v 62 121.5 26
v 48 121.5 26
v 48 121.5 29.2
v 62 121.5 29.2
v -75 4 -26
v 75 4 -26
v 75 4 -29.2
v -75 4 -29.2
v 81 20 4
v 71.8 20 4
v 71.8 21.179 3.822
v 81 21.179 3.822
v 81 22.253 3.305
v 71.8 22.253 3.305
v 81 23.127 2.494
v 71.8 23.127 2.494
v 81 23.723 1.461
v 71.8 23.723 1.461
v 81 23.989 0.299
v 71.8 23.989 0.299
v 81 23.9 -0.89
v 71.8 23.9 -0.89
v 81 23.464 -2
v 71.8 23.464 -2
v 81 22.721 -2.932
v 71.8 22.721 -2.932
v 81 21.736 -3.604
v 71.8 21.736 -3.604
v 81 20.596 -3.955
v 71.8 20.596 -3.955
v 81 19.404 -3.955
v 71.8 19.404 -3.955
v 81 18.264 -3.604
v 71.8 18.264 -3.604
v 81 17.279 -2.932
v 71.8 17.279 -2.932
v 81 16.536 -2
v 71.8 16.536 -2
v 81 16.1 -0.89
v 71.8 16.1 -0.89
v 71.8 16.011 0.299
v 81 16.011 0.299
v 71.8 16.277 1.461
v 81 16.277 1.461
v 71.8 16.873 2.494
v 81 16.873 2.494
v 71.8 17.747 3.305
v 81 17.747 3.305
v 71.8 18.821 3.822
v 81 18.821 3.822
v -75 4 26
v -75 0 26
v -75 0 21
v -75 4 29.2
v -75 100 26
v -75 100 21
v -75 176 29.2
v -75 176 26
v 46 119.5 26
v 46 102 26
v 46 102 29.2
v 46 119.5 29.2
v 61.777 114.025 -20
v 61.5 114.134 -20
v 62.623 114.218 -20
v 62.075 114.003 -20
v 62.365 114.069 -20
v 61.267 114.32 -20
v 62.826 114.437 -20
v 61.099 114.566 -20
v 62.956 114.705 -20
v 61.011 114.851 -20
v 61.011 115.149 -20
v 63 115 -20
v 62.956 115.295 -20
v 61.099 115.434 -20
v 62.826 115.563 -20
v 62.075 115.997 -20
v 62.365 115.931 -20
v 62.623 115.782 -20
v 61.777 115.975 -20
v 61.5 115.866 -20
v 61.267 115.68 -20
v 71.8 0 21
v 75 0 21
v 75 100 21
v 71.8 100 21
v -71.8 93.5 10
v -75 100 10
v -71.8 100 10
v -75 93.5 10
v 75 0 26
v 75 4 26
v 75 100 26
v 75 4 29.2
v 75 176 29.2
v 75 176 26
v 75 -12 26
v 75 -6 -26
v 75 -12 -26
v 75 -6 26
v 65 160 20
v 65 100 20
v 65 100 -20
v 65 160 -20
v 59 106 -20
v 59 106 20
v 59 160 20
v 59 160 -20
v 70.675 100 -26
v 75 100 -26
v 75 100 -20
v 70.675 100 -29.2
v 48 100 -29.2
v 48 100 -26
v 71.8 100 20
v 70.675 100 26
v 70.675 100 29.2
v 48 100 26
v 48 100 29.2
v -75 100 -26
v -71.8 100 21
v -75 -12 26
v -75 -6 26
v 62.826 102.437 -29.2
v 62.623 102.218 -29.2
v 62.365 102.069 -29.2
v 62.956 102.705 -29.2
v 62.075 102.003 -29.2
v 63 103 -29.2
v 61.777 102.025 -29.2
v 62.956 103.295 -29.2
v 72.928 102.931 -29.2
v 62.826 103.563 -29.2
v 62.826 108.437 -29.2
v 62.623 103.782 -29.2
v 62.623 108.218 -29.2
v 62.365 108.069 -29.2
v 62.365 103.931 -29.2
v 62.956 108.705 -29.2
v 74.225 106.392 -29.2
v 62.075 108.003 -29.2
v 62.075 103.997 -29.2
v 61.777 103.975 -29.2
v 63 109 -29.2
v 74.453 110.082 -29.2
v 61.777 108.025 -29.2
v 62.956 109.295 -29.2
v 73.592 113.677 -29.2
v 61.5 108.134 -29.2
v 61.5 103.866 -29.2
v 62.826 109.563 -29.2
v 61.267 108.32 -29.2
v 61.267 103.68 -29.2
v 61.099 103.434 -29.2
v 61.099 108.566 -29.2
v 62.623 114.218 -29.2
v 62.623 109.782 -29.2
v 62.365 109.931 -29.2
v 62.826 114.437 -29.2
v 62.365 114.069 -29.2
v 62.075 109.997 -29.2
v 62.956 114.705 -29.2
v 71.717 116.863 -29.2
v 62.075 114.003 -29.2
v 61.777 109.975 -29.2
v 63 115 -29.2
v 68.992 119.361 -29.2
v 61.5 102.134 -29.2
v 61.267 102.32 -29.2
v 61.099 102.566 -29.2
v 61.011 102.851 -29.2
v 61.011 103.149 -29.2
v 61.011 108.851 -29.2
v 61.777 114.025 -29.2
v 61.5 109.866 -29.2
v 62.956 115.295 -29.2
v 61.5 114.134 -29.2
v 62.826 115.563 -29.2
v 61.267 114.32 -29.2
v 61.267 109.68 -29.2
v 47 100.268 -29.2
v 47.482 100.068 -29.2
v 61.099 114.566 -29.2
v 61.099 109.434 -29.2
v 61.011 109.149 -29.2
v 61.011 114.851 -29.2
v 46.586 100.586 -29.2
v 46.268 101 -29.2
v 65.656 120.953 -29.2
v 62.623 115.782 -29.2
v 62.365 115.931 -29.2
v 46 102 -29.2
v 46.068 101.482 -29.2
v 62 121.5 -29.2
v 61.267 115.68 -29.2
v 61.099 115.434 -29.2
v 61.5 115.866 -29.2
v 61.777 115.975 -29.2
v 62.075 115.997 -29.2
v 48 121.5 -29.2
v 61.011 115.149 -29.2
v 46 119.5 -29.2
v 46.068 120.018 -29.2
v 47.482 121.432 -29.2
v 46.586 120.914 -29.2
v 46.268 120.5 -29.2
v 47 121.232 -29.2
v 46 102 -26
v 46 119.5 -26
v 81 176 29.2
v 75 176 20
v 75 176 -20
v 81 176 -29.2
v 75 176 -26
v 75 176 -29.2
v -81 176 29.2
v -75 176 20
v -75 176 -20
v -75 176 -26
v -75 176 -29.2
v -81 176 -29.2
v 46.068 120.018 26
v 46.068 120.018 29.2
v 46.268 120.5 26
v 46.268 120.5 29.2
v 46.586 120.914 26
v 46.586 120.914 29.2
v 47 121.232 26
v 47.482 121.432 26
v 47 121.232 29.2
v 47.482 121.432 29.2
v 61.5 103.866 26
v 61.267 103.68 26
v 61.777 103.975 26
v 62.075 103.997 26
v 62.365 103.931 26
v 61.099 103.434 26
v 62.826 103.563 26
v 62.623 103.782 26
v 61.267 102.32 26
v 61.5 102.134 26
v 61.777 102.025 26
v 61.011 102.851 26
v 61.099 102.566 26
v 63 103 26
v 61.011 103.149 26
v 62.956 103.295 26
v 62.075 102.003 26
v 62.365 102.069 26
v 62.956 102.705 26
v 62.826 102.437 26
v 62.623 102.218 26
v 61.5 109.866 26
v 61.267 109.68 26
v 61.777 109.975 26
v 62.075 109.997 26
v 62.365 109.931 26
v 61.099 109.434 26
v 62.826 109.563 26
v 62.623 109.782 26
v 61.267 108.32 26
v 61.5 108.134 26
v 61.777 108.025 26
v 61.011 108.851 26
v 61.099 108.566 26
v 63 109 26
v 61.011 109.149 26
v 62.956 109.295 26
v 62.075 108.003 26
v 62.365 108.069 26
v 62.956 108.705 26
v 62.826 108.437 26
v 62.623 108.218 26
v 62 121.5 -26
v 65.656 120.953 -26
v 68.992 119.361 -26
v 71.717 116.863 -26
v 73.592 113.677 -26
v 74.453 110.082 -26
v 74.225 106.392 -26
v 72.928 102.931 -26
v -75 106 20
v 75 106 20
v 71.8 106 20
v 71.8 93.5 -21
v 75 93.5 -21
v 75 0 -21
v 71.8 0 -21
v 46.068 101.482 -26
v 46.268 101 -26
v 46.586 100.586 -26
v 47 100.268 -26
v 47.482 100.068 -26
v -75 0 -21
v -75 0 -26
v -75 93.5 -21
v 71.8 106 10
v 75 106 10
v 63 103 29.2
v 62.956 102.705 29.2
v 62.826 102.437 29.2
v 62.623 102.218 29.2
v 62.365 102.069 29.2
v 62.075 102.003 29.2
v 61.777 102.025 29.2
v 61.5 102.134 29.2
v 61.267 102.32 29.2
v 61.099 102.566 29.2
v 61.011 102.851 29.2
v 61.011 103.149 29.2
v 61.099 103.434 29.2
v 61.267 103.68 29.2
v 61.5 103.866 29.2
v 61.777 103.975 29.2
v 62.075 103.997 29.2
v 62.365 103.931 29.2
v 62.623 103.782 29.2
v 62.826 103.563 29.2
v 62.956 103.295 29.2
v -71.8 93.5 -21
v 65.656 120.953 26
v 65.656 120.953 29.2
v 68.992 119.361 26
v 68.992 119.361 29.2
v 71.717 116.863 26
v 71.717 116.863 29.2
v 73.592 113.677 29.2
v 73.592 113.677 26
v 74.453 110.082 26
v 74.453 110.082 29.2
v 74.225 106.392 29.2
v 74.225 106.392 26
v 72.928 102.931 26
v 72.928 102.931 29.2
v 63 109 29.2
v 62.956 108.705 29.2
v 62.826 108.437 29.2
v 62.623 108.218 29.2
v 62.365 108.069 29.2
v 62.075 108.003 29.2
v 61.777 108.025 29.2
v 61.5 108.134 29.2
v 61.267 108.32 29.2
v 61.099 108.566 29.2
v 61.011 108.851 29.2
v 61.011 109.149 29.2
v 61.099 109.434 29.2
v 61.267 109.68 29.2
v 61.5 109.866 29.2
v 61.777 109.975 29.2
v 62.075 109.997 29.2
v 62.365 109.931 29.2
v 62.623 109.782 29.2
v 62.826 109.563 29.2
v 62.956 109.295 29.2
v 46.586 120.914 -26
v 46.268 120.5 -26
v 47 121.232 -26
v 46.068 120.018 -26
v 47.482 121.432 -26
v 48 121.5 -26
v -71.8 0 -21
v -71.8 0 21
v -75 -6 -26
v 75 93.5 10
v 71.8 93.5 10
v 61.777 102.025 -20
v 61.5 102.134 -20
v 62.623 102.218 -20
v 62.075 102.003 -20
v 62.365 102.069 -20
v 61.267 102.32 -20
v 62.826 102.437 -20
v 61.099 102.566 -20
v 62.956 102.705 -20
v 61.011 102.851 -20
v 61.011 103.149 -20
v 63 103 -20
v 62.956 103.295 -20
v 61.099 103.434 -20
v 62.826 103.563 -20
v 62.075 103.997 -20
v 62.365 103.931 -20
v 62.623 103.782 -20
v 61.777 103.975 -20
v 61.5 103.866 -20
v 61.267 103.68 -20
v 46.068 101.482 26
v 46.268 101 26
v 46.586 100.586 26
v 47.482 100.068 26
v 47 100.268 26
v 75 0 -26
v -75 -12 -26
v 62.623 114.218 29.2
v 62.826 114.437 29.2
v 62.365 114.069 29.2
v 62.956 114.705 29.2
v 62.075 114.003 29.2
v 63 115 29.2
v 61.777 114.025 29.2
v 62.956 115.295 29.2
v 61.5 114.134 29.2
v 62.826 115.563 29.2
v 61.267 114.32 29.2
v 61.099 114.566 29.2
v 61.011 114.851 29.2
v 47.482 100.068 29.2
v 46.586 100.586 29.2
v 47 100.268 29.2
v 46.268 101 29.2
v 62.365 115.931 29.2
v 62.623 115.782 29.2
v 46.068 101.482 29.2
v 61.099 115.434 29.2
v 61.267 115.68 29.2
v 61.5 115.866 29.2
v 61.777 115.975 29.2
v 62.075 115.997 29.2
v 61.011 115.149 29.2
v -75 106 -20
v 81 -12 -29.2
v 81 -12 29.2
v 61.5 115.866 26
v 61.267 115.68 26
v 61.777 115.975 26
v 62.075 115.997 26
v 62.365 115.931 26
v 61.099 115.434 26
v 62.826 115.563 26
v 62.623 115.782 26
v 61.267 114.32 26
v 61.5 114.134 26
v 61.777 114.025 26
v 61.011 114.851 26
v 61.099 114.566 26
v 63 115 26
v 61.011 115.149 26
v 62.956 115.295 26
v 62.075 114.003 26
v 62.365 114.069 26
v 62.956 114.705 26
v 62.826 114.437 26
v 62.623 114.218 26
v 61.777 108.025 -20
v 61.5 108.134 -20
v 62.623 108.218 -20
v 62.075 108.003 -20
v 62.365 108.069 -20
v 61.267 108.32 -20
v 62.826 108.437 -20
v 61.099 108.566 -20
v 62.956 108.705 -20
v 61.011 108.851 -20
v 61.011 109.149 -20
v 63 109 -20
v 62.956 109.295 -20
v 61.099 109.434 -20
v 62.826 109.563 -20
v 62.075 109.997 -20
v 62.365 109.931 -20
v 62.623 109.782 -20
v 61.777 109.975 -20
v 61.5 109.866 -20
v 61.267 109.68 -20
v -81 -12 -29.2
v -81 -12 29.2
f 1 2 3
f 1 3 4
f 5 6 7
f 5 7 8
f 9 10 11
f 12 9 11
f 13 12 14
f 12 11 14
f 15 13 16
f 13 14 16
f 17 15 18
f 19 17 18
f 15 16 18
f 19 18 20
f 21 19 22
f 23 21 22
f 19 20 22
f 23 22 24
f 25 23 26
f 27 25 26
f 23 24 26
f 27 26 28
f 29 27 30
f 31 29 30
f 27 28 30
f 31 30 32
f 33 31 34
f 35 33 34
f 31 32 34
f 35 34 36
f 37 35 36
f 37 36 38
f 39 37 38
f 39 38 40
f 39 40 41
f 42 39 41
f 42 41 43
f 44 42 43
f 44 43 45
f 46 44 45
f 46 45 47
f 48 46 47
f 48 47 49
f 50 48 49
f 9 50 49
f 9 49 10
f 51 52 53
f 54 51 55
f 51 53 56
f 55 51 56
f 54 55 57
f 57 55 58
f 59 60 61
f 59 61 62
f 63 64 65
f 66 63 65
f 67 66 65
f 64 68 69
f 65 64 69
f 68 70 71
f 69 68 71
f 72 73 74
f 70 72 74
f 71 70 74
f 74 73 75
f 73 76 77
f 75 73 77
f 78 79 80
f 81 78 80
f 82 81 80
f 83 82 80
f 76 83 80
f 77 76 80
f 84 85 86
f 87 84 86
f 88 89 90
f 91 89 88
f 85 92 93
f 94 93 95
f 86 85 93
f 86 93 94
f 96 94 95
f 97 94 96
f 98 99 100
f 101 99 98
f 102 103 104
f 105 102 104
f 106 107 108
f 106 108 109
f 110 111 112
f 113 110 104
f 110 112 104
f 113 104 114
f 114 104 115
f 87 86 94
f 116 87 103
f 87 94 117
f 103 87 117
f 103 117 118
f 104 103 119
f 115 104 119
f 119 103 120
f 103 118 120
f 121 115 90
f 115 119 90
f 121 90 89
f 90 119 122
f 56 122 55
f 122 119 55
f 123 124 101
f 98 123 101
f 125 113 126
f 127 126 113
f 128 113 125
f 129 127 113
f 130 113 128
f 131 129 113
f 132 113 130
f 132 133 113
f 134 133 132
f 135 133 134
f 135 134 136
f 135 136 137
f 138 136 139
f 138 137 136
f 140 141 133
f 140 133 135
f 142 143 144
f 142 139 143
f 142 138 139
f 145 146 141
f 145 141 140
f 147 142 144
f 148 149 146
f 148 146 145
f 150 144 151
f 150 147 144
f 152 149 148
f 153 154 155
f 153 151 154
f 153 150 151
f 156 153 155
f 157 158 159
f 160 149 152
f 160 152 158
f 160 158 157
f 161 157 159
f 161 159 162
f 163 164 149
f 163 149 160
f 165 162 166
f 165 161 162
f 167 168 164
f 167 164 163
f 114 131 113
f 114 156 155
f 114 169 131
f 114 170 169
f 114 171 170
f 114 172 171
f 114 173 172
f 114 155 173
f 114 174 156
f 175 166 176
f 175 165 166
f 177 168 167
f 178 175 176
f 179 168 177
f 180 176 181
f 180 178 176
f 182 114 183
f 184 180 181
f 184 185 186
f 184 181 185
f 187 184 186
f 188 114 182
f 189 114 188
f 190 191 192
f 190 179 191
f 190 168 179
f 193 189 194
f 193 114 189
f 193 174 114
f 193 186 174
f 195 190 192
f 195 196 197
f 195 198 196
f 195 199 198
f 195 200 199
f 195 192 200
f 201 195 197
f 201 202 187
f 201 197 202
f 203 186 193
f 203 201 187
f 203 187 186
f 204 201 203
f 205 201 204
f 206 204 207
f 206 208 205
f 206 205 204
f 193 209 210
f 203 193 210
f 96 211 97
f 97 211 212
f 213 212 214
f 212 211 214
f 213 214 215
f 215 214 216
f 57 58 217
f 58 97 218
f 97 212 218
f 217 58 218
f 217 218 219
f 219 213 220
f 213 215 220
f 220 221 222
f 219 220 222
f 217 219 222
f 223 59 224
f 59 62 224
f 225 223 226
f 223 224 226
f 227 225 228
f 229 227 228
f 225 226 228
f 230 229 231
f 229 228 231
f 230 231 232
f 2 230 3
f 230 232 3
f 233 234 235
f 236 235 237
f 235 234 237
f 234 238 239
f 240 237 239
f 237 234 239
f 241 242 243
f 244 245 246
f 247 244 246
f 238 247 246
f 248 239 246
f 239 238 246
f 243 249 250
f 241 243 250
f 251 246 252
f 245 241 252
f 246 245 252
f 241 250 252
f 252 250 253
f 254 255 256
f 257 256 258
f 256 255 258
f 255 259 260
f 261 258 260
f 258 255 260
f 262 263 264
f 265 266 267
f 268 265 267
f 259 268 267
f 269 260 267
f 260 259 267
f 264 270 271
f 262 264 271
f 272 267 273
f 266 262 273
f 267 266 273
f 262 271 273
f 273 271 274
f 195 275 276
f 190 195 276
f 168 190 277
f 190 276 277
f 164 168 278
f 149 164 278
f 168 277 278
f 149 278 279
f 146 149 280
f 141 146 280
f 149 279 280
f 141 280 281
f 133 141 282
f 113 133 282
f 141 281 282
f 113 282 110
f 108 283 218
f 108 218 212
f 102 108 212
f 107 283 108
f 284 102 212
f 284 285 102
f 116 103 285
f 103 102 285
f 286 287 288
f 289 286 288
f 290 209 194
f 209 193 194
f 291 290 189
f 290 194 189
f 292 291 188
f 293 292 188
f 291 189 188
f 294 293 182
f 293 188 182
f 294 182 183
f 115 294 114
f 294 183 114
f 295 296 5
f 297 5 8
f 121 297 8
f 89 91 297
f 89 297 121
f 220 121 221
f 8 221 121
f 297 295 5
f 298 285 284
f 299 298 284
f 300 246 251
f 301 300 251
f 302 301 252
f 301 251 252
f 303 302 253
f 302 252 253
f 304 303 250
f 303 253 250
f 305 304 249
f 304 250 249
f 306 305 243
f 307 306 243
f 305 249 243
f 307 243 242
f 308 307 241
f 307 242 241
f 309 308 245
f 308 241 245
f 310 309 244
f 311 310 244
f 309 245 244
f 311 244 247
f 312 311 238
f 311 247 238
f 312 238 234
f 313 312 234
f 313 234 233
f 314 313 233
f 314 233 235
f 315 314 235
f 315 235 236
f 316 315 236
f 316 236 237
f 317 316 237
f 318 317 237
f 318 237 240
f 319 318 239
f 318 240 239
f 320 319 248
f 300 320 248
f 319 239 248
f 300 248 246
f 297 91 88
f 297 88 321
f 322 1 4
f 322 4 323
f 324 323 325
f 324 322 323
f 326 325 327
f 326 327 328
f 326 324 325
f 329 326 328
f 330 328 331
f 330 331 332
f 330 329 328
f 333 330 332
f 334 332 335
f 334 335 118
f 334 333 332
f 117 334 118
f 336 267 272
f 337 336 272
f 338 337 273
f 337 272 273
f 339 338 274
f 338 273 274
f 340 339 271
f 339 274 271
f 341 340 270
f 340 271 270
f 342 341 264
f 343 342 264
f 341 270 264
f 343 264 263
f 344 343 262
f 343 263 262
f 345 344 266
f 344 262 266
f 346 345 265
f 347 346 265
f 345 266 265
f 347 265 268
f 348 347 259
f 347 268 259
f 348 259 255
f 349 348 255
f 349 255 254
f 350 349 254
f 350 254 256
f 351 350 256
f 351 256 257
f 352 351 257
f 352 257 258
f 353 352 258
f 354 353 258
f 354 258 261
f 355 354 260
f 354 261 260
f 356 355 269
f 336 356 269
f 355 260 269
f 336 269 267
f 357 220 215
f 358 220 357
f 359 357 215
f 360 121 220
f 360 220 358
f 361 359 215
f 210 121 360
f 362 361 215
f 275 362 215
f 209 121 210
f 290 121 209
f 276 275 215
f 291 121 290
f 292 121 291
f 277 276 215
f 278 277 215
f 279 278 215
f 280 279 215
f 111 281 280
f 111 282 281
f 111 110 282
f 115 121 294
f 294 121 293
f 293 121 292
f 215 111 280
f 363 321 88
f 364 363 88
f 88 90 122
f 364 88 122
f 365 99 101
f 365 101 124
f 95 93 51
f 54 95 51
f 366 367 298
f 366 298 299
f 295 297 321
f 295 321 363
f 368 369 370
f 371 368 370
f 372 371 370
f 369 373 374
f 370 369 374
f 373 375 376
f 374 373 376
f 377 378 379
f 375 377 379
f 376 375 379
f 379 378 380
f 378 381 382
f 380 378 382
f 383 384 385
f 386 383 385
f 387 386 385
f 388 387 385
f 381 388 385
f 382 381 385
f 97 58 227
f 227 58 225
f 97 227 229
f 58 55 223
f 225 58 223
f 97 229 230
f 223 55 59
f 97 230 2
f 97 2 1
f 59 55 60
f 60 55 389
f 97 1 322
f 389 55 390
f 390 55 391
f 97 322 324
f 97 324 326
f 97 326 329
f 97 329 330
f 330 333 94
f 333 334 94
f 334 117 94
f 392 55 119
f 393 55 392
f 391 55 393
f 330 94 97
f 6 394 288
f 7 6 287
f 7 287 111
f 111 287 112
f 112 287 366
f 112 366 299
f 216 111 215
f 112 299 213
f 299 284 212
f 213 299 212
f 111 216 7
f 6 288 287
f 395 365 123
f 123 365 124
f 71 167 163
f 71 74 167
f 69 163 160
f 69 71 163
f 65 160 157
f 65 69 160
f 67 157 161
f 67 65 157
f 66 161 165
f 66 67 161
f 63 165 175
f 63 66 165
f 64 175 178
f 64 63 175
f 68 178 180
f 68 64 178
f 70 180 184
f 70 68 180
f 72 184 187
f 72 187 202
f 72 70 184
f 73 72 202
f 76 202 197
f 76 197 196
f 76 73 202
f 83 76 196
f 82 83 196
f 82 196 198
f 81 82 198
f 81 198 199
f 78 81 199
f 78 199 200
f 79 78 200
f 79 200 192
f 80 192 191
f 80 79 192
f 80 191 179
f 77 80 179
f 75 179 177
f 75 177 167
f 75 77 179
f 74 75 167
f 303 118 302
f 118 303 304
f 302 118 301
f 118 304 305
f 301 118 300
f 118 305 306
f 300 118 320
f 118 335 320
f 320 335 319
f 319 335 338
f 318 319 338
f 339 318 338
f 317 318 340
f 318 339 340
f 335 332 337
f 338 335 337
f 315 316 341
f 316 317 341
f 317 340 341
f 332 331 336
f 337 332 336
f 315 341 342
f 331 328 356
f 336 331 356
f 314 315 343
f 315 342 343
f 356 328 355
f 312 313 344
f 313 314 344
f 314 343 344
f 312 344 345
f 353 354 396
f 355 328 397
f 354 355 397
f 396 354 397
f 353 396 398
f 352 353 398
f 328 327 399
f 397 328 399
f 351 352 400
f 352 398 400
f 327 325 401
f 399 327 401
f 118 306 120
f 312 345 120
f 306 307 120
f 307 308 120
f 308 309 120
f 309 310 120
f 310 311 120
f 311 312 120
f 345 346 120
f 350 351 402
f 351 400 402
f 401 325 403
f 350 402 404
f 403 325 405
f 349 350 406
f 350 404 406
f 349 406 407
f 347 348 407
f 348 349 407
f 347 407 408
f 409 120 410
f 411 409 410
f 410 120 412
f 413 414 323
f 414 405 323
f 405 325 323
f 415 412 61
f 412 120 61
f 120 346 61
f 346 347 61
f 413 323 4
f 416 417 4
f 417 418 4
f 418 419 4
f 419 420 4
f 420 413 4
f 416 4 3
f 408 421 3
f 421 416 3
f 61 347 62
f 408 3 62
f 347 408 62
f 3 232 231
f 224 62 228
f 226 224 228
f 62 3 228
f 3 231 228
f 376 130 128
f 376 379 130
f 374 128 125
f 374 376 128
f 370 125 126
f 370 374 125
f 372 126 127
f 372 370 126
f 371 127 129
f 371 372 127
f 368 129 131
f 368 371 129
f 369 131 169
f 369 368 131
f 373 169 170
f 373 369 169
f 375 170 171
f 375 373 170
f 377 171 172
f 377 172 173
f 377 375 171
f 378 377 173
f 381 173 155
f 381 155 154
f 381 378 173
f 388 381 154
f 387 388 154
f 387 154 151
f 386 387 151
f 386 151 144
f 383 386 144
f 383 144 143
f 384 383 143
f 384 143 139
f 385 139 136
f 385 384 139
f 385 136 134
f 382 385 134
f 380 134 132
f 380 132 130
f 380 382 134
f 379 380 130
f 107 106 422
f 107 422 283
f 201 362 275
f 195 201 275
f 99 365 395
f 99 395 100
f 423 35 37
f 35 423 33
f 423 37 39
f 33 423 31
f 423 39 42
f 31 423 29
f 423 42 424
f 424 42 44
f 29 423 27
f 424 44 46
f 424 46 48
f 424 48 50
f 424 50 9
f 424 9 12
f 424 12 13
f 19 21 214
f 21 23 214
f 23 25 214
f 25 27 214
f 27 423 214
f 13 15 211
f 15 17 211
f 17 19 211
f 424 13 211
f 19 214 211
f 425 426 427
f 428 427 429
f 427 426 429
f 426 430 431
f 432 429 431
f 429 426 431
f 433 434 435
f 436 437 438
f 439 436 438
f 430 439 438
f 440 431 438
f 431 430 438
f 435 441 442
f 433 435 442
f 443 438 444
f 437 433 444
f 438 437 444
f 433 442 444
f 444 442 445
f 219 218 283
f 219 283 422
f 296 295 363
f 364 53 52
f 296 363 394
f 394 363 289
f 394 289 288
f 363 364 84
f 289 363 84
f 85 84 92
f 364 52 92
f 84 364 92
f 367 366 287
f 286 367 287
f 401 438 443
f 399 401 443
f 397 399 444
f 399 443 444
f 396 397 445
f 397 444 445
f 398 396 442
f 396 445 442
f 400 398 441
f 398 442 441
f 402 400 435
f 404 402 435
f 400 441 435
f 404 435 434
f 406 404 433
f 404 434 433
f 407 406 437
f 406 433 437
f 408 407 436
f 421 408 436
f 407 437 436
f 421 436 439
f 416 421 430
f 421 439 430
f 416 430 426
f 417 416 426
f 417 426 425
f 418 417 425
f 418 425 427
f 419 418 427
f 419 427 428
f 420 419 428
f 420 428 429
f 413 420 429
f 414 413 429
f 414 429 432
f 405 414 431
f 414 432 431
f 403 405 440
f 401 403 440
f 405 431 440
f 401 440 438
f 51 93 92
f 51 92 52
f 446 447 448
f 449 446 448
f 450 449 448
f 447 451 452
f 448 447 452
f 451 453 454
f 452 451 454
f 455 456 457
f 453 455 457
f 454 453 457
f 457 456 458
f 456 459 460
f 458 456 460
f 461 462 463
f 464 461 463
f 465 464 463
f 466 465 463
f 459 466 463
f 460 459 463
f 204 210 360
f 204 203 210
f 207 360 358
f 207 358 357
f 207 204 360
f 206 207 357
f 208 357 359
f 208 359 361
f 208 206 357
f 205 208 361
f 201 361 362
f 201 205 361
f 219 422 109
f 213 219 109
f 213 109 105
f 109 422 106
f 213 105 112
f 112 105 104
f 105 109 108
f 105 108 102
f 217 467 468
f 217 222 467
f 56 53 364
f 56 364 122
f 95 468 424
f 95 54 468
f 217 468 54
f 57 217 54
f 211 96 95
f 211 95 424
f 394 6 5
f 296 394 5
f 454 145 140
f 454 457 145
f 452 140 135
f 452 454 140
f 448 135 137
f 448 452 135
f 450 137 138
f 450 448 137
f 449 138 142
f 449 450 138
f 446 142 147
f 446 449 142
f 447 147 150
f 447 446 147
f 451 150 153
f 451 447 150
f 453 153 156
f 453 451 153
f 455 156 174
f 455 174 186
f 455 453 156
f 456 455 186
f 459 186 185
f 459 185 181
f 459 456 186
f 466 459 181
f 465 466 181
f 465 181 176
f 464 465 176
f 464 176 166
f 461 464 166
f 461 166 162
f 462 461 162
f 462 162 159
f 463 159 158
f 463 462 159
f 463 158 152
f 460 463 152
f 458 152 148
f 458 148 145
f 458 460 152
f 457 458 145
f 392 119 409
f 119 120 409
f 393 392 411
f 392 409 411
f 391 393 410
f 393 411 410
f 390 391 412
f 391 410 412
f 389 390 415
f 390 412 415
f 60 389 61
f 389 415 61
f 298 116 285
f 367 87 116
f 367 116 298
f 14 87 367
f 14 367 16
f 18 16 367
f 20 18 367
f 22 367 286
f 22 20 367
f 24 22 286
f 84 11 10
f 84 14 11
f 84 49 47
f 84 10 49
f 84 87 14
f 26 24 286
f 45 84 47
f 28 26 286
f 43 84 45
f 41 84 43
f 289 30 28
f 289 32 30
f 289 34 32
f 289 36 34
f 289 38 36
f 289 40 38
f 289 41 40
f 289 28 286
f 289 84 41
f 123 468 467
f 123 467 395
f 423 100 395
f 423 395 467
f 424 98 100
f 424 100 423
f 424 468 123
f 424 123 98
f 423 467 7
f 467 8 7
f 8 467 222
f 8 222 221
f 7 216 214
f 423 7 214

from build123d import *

# Parameters (mm, degrees)
SKETCH1_W            = 150
SKETCH1_H            = 42
BOSS_EXTRUDE1_DEPTH  = 3.2
SKETCH2_W            = 162
SKETCH2_H            = 52
BOSS_EXTRUDE2_DEPTH  = 6
SKETCH3_W            = 6
SKETCH3_H            = 52
BOSS_EXTRUDE3_DEPTH  = 176
BOSS_EXTRUDE4_REACH  = 238.618
SKETCH5_W            = 52
SKETCH5_H            = 6
BOSS_EXTRUDE5_START  = 100
SKETCH1_2_W          = 150
SKETCH1_2_H          = 42
BOSS_EXTRUDE5_DEPTH  = 3.2
SKETCH6_W            = 150
SKETCH6_H            = 6
BOSS_EXTRUDE6_DEPTH  = 70
CUT_EXTRUDE1_REACH   = 142.645
SKETCH7_W            = 10
SKETCH7_H            = 40
SKETCH7_R            = 3
SKETCH7_3_W          = 6
SKETCH7_3_H          = 40
BOSS_EXTRUDE7_DEPTH  = 54
SKETCH8_W            = 162
SKETCH8_H            = 10
BOSS_EXTRUDE8_DEPTH  = 3.2
SKETCH9_W            = 150
SKETCH9_H            = 42
CUT_EXTRUDE2_DEPTH   = 3.2
CUT_EXTRUDE3_DEPTH   = 3.2
BOSS_EXTRUDE9_DEPTH  = 3.2
SKETCH12_W           = 3.2
SKETCH12_H           = 10
BOSS_EXTRUDE10_DEPTH = 6
CUT_EXTRUDE4_REACH   = 236.897
SKETCH13_R           = 4
CUT_EXTRUDE5_REACH   = 201.894
SKETCH14_R           = 1
SKETCH16_W           = 6
SKETCH16_H           = 172
BOSS_EXTRUDE11_DEPTH = 3.2
SKETCH17_W           = 162
SKETCH17_H           = 58.4
SKETCH17_W_2         = 150
SKETCH17_H_2         = 52
BOSS_EXTRUDE12_DEPTH = 6
SKETCH15_R           = 1
BOSS_EXTRUDE14_DEPTH = 3.2
FILLET1_R            = 2
FILLET1_OF_MIRROR4_R = 2


with BuildPart() as part:
    # Sketch1 → Boss-Extrude1 (new body)
    with BuildSketch(Plane(origin=(0, 0, 0), x_dir=(1, 0, 0), z_dir=(0, 1, 0))):
        Rectangle(SKETCH1_W, SKETCH1_H)
    extrude(amount=BOSS_EXTRUDE1_DEPTH)

    # Sketch2 → Boss-Extrude2 (add)
    with BuildSketch(Plane.XZ):
        Rectangle(SKETCH2_W, SKETCH2_H)
    extrude(amount=BOSS_EXTRUDE2_DEPTH)

    # Sketch3 → Boss-Extrude3 (add)
    with BuildSketch(Plane(origin=(0, 0, 0), x_dir=(1, 0, 0), z_dir=(0, 1, 0))):
        with Locations((78, 0)):
            Rectangle(SKETCH3_W, SKETCH3_H)
        with Locations((-78, 0)):
            Rectangle(SKETCH3_W, SKETCH3_H)
    extrude(amount=BOSS_EXTRUDE3_DEPTH)

    # Sketch5 → Boss-Extrude4 (add, up to next)
    with BuildSketch(Plane.ZY.offset(-75), mode=Mode.PRIVATE) as boss_extrude4_sk1:
        with Locations((0, 103)):
            Rectangle(SKETCH5_W, SKETCH5_H)
    boss_extrude4_tool1 = extrude(boss_extrude4_sk1.sketch, amount=BOSS_EXTRUDE4_REACH, mode=Mode.PRIVATE) - part.part
    add(boss_extrude4_tool1.solids().sort_by_distance((75, 103, 0))[0])

    # Sketch1<2> → Boss-Extrude5 (add)
    with BuildSketch(Plane(origin=(0, 0, 0), x_dir=(1, 0, 0), z_dir=(0, 1, 0)).offset(BOSS_EXTRUDE5_START)):
        Rectangle(SKETCH1_2_W, SKETCH1_2_H)
    extrude(amount=-BOSS_EXTRUDE5_DEPTH)

    # Sketch6 → Boss-Extrude6 (add)
    with BuildSketch(Plane(origin=(0, 106, 0), x_dir=(1, 0, 0), z_dir=(0, 1, 0))):
        with Locations((0, -23)):
            Rectangle(SKETCH6_W, SKETCH6_H)
        with Locations((0, 23)):
            Rectangle(SKETCH6_W, SKETCH6_H)
    extrude(amount=BOSS_EXTRUDE6_DEPTH)

    # Sketch7 → Cut-Extrude1 (cut, up to next)
    with BuildSketch(Plane(origin=(0, 106, 0), x_dir=(1, 0, 0), z_dir=(0, 1, 0)), mode=Mode.PRIVATE) as cut_extrude1_sk1:
        with Locations((70, 0)):
            Rectangle(SKETCH7_W, SKETCH7_H)
        with Locations((70, -15)):
            Circle(SKETCH7_R, mode=Mode.SUBTRACT)
        with Locations((70, 15)):
            Circle(SKETCH7_R, mode=Mode.SUBTRACT)
    cut_extrude1_tool1 = extrude(cut_extrude1_sk1.sketch, amount=-CUT_EXTRUDE1_REACH, mode=Mode.PRIVATE) & part.part
    # Sketch7 → Cut-Extrude1 (cut, up to next)
    with BuildSketch(Plane(origin=(0, 106, 0), x_dir=(1, 0, 0), z_dir=(0, 1, 0)), mode=Mode.PRIVATE) as cut_extrude1_sk2:
        with Locations((70, -15)):
            Circle(SKETCH7_R)
    cut_extrude1_tool2 = extrude(cut_extrude1_sk2.sketch, amount=-CUT_EXTRUDE1_REACH, mode=Mode.PRIVATE) & part.part
    # Sketch7 → Cut-Extrude1 (cut, up to next)
    with BuildSketch(Plane(origin=(0, 106, 0), x_dir=(1, 0, 0), z_dir=(0, 1, 0)), mode=Mode.PRIVATE) as cut_extrude1_sk3:
        with Locations((70, 15)):
            Circle(SKETCH7_R)
    cut_extrude1_tool3 = extrude(cut_extrude1_sk3.sketch, amount=-CUT_EXTRUDE1_REACH, mode=Mode.PRIVATE) & part.part
    add(cut_extrude1_tool1.solids().sort_by_distance((70, 106, 0))[0], mode=Mode.SUBTRACT)
    add(cut_extrude1_tool2.solids().sort_by_distance((70, 106, 15))[0], mode=Mode.SUBTRACT)
    add(cut_extrude1_tool3.solids().sort_by_distance((70, 106, -15))[0], mode=Mode.SUBTRACT)

    # Sketch7<3> → Boss-Extrude7 (add)
    with BuildSketch(Plane(origin=(0, 106, 0), x_dir=(1, 0, 0), z_dir=(0, 1, 0))):
        with Locations((62, 0)):
            Rectangle(SKETCH7_3_W, SKETCH7_3_H)
    extrude(amount=BOSS_EXTRUDE7_DEPTH)

    # Sketch8 → Boss-Extrude8 (add)
    with BuildSketch(Plane(origin=(0, 0, -26), x_dir=(-1, 0, 0), z_dir=(0, 0, -1))):
        with Locations((0, -1)):
            Rectangle(SKETCH8_W, SKETCH8_H)
    boss_extrude8 = extrude(amount=BOSS_EXTRUDE8_DEPTH)

    # Mirror1: Boss-Extrude8 across plane
    add(boss_extrude8.mirror(Plane.XY))

    # Sketch9 → Cut-Extrude2 (cut)
    with BuildSketch(Plane(origin=(0, 3.2, 0), x_dir=(1, 0, 0), z_dir=(0, 1, 0))):
        Rectangle(SKETCH9_W, SKETCH9_H)
    extrude(amount=-CUT_EXTRUDE2_DEPTH, mode=Mode.SUBTRACT)

    # Sketch10 → Cut-Extrude3 (cut)
    with BuildSketch(Plane.XZ.offset(-96.8)):
        Polygon((-75, -21), (75, -21), (75, -20), (65, -20), (65, 20), (75, 20), (75, 21), (-75, 21), align=None)
    extrude(amount=-CUT_EXTRUDE3_DEPTH, mode=Mode.SUBTRACT)

    # Sketch11 → Boss-Extrude9 (add)
    with BuildSketch(Plane.ZY.offset(-75)):
        Polygon((10, 93.5), (-21, 93.5), (-21, 0), (21, 0), (21, 100), (10, 100), align=None)
    boss_extrude9 = extrude(amount=BOSS_EXTRUDE9_DEPTH)

    # Mirror2: Boss-Extrude9 across plane
    add(boss_extrude9.mirror(Plane(origin=(0, 0, 0), x_dir=(0, 0, 1), z_dir=(1, 0, 0))))

    # Sketch12 → Boss-Extrude10 (add)
    with BuildSketch(Plane(origin=(0, 100, 0), x_dir=(1, 0, 0), z_dir=(0, 1, 0))):
        with Locations((73.4, -15)):
            Rectangle(SKETCH12_W, SKETCH12_H)
    extrude(amount=BOSS_EXTRUDE10_DEPTH)

    # Sketch13 → Cut-Extrude4 (cut, up to next)
    with BuildSketch(Plane.ZY.offset(-71.8), mode=Mode.PRIVATE) as cut_extrude4_sk1:
        with Locations((0, 20)):
            Circle(SKETCH13_R)
    cut_extrude4_tool1 = extrude(cut_extrude4_sk1.sketch, amount=-CUT_EXTRUDE4_REACH, mode=Mode.PRIVATE) & part.part
    add(cut_extrude4_tool1.solids().sort_by_distance((71.8, 20, 0))[0], mode=Mode.SUBTRACT)

    # Sketch14 → Cut-Extrude5 (cut, up to next)
    with BuildSketch(Plane.XY.offset(-20), mode=Mode.PRIVATE) as cut_extrude5_sk1:
        with Locations((62, 103)):
            Circle(SKETCH14_R)
    cut_extrude5_tool1 = extrude(cut_extrude5_sk1.sketch, amount=-CUT_EXTRUDE5_REACH, mode=Mode.PRIVATE) & part.part
    # Sketch14 → Cut-Extrude5 (cut, up to next)
    with BuildSketch(Plane.XY.offset(-20), mode=Mode.PRIVATE) as cut_extrude5_sk2:
        with Locations((62, 109)):
            Circle(SKETCH14_R)
    cut_extrude5_tool2 = extrude(cut_extrude5_sk2.sketch, amount=-CUT_EXTRUDE5_REACH, mode=Mode.PRIVATE) & part.part
    # Sketch14 → Cut-Extrude5 (cut, up to next)
    with BuildSketch(Plane.XY.offset(-20), mode=Mode.PRIVATE) as cut_extrude5_sk3:
        with Locations((62, 115)):
            Circle(SKETCH14_R)
    cut_extrude5_tool3 = extrude(cut_extrude5_sk3.sketch, amount=-CUT_EXTRUDE5_REACH, mode=Mode.PRIVATE) & part.part
    add(cut_extrude5_tool1.solids().sort_by_distance((62, 103, -20))[0], mode=Mode.SUBTRACT)
    add(cut_extrude5_tool2.solids().sort_by_distance((62, 109, -20))[0], mode=Mode.SUBTRACT)
    add(cut_extrude5_tool3.solids().sort_by_distance((62, 115, -20))[0], mode=Mode.SUBTRACT)

    # Sketch16 → Boss-Extrude11 (add)
    with BuildSketch(Plane(origin=(0, 0, -26), x_dir=(-1, 0, 0), z_dir=(0, 0, -1))):
        with Locations((78, 90)):
            Rectangle(SKETCH16_W, SKETCH16_H)
        with Locations((-78, 90)):
            Rectangle(SKETCH16_W, SKETCH16_H)
    boss_extrude11 = extrude(amount=BOSS_EXTRUDE11_DEPTH)

    # Mirror3: Boss-Extrude11 across plane
    add(boss_extrude11.mirror(Plane.XY))

    # Sketch17 → Boss-Extrude12 (add)
    with BuildSketch(Plane.XZ.offset(6)):
        Rectangle(SKETCH17_W, SKETCH17_H)
        Rectangle(SKETCH17_W_2, SKETCH17_H_2, mode=Mode.SUBTRACT)
    extrude(amount=BOSS_EXTRUDE12_DEPTH)

    # Sketch15 → Boss-Extrude14 (add)
    with BuildSketch(Plane(origin=(0, 0, -26), x_dir=(-1, 0, 0), z_dir=(0, 0, -1))):
        with BuildLine():
            ThreePointArc((-62, 121.5), (-50.407976881, 113.677071733), (-53.325324214, 100))
            Line((-53.325324214, 100), (-46, 100))
            Line((-46, 100), (-46, 121.5))
            Line((-46, 121.5), (-62, 121.5))
        make_face()
        with BuildLine():
            ThreePointArc((-62, 121.5), (-73.592023119, 113.677071733), (-70.674675786, 100))
            Line((-70.674675786, 100), (-53.325324214, 100))
            ThreePointArc((-53.325324214, 100), (-50.407976881, 113.677071733), (-62, 121.5))
        make_face()
        with Locations(Location((-62, 103, 0), (0, 0, 180))):
            Circle(SKETCH15_R, mode=Mode.SUBTRACT)
        with Locations(Location((-62, 109, 0), (0, 0, 180))):
            Circle(SKETCH15_R, mode=Mode.SUBTRACT)
        with Locations(Location((-62, 115, 0), (0, 0, 180))):
            Circle(SKETCH15_R, mode=Mode.SUBTRACT)
    boss_extrude14 = extrude(amount=BOSS_EXTRUDE14_DEPTH)

    # Fillet1
    fillet1_edges = [part.edges().sort_by_distance(p)[0] for p in [
        (46, 121.5, -27.6),
        (46, 100, -27.6),
    ]]
    fillet(fillet1_edges, radius=FILLET1_R)

    # Mirror4: Boss-Extrude14 across plane
    add(boss_extrude14.mirror(Plane.XY))

    # Fillet1 of Mirror4
    fillet1_of_mirror4_edges = [part.edges().sort_by_distance(p)[0] for p in [
        (46, 121.5, 27.6),
        (46, 100, 27.6),
    ]]
    fillet(fillet1_of_mirror4_edges, radius=FILLET1_OF_MIRROR4_R)


solid = part.part
